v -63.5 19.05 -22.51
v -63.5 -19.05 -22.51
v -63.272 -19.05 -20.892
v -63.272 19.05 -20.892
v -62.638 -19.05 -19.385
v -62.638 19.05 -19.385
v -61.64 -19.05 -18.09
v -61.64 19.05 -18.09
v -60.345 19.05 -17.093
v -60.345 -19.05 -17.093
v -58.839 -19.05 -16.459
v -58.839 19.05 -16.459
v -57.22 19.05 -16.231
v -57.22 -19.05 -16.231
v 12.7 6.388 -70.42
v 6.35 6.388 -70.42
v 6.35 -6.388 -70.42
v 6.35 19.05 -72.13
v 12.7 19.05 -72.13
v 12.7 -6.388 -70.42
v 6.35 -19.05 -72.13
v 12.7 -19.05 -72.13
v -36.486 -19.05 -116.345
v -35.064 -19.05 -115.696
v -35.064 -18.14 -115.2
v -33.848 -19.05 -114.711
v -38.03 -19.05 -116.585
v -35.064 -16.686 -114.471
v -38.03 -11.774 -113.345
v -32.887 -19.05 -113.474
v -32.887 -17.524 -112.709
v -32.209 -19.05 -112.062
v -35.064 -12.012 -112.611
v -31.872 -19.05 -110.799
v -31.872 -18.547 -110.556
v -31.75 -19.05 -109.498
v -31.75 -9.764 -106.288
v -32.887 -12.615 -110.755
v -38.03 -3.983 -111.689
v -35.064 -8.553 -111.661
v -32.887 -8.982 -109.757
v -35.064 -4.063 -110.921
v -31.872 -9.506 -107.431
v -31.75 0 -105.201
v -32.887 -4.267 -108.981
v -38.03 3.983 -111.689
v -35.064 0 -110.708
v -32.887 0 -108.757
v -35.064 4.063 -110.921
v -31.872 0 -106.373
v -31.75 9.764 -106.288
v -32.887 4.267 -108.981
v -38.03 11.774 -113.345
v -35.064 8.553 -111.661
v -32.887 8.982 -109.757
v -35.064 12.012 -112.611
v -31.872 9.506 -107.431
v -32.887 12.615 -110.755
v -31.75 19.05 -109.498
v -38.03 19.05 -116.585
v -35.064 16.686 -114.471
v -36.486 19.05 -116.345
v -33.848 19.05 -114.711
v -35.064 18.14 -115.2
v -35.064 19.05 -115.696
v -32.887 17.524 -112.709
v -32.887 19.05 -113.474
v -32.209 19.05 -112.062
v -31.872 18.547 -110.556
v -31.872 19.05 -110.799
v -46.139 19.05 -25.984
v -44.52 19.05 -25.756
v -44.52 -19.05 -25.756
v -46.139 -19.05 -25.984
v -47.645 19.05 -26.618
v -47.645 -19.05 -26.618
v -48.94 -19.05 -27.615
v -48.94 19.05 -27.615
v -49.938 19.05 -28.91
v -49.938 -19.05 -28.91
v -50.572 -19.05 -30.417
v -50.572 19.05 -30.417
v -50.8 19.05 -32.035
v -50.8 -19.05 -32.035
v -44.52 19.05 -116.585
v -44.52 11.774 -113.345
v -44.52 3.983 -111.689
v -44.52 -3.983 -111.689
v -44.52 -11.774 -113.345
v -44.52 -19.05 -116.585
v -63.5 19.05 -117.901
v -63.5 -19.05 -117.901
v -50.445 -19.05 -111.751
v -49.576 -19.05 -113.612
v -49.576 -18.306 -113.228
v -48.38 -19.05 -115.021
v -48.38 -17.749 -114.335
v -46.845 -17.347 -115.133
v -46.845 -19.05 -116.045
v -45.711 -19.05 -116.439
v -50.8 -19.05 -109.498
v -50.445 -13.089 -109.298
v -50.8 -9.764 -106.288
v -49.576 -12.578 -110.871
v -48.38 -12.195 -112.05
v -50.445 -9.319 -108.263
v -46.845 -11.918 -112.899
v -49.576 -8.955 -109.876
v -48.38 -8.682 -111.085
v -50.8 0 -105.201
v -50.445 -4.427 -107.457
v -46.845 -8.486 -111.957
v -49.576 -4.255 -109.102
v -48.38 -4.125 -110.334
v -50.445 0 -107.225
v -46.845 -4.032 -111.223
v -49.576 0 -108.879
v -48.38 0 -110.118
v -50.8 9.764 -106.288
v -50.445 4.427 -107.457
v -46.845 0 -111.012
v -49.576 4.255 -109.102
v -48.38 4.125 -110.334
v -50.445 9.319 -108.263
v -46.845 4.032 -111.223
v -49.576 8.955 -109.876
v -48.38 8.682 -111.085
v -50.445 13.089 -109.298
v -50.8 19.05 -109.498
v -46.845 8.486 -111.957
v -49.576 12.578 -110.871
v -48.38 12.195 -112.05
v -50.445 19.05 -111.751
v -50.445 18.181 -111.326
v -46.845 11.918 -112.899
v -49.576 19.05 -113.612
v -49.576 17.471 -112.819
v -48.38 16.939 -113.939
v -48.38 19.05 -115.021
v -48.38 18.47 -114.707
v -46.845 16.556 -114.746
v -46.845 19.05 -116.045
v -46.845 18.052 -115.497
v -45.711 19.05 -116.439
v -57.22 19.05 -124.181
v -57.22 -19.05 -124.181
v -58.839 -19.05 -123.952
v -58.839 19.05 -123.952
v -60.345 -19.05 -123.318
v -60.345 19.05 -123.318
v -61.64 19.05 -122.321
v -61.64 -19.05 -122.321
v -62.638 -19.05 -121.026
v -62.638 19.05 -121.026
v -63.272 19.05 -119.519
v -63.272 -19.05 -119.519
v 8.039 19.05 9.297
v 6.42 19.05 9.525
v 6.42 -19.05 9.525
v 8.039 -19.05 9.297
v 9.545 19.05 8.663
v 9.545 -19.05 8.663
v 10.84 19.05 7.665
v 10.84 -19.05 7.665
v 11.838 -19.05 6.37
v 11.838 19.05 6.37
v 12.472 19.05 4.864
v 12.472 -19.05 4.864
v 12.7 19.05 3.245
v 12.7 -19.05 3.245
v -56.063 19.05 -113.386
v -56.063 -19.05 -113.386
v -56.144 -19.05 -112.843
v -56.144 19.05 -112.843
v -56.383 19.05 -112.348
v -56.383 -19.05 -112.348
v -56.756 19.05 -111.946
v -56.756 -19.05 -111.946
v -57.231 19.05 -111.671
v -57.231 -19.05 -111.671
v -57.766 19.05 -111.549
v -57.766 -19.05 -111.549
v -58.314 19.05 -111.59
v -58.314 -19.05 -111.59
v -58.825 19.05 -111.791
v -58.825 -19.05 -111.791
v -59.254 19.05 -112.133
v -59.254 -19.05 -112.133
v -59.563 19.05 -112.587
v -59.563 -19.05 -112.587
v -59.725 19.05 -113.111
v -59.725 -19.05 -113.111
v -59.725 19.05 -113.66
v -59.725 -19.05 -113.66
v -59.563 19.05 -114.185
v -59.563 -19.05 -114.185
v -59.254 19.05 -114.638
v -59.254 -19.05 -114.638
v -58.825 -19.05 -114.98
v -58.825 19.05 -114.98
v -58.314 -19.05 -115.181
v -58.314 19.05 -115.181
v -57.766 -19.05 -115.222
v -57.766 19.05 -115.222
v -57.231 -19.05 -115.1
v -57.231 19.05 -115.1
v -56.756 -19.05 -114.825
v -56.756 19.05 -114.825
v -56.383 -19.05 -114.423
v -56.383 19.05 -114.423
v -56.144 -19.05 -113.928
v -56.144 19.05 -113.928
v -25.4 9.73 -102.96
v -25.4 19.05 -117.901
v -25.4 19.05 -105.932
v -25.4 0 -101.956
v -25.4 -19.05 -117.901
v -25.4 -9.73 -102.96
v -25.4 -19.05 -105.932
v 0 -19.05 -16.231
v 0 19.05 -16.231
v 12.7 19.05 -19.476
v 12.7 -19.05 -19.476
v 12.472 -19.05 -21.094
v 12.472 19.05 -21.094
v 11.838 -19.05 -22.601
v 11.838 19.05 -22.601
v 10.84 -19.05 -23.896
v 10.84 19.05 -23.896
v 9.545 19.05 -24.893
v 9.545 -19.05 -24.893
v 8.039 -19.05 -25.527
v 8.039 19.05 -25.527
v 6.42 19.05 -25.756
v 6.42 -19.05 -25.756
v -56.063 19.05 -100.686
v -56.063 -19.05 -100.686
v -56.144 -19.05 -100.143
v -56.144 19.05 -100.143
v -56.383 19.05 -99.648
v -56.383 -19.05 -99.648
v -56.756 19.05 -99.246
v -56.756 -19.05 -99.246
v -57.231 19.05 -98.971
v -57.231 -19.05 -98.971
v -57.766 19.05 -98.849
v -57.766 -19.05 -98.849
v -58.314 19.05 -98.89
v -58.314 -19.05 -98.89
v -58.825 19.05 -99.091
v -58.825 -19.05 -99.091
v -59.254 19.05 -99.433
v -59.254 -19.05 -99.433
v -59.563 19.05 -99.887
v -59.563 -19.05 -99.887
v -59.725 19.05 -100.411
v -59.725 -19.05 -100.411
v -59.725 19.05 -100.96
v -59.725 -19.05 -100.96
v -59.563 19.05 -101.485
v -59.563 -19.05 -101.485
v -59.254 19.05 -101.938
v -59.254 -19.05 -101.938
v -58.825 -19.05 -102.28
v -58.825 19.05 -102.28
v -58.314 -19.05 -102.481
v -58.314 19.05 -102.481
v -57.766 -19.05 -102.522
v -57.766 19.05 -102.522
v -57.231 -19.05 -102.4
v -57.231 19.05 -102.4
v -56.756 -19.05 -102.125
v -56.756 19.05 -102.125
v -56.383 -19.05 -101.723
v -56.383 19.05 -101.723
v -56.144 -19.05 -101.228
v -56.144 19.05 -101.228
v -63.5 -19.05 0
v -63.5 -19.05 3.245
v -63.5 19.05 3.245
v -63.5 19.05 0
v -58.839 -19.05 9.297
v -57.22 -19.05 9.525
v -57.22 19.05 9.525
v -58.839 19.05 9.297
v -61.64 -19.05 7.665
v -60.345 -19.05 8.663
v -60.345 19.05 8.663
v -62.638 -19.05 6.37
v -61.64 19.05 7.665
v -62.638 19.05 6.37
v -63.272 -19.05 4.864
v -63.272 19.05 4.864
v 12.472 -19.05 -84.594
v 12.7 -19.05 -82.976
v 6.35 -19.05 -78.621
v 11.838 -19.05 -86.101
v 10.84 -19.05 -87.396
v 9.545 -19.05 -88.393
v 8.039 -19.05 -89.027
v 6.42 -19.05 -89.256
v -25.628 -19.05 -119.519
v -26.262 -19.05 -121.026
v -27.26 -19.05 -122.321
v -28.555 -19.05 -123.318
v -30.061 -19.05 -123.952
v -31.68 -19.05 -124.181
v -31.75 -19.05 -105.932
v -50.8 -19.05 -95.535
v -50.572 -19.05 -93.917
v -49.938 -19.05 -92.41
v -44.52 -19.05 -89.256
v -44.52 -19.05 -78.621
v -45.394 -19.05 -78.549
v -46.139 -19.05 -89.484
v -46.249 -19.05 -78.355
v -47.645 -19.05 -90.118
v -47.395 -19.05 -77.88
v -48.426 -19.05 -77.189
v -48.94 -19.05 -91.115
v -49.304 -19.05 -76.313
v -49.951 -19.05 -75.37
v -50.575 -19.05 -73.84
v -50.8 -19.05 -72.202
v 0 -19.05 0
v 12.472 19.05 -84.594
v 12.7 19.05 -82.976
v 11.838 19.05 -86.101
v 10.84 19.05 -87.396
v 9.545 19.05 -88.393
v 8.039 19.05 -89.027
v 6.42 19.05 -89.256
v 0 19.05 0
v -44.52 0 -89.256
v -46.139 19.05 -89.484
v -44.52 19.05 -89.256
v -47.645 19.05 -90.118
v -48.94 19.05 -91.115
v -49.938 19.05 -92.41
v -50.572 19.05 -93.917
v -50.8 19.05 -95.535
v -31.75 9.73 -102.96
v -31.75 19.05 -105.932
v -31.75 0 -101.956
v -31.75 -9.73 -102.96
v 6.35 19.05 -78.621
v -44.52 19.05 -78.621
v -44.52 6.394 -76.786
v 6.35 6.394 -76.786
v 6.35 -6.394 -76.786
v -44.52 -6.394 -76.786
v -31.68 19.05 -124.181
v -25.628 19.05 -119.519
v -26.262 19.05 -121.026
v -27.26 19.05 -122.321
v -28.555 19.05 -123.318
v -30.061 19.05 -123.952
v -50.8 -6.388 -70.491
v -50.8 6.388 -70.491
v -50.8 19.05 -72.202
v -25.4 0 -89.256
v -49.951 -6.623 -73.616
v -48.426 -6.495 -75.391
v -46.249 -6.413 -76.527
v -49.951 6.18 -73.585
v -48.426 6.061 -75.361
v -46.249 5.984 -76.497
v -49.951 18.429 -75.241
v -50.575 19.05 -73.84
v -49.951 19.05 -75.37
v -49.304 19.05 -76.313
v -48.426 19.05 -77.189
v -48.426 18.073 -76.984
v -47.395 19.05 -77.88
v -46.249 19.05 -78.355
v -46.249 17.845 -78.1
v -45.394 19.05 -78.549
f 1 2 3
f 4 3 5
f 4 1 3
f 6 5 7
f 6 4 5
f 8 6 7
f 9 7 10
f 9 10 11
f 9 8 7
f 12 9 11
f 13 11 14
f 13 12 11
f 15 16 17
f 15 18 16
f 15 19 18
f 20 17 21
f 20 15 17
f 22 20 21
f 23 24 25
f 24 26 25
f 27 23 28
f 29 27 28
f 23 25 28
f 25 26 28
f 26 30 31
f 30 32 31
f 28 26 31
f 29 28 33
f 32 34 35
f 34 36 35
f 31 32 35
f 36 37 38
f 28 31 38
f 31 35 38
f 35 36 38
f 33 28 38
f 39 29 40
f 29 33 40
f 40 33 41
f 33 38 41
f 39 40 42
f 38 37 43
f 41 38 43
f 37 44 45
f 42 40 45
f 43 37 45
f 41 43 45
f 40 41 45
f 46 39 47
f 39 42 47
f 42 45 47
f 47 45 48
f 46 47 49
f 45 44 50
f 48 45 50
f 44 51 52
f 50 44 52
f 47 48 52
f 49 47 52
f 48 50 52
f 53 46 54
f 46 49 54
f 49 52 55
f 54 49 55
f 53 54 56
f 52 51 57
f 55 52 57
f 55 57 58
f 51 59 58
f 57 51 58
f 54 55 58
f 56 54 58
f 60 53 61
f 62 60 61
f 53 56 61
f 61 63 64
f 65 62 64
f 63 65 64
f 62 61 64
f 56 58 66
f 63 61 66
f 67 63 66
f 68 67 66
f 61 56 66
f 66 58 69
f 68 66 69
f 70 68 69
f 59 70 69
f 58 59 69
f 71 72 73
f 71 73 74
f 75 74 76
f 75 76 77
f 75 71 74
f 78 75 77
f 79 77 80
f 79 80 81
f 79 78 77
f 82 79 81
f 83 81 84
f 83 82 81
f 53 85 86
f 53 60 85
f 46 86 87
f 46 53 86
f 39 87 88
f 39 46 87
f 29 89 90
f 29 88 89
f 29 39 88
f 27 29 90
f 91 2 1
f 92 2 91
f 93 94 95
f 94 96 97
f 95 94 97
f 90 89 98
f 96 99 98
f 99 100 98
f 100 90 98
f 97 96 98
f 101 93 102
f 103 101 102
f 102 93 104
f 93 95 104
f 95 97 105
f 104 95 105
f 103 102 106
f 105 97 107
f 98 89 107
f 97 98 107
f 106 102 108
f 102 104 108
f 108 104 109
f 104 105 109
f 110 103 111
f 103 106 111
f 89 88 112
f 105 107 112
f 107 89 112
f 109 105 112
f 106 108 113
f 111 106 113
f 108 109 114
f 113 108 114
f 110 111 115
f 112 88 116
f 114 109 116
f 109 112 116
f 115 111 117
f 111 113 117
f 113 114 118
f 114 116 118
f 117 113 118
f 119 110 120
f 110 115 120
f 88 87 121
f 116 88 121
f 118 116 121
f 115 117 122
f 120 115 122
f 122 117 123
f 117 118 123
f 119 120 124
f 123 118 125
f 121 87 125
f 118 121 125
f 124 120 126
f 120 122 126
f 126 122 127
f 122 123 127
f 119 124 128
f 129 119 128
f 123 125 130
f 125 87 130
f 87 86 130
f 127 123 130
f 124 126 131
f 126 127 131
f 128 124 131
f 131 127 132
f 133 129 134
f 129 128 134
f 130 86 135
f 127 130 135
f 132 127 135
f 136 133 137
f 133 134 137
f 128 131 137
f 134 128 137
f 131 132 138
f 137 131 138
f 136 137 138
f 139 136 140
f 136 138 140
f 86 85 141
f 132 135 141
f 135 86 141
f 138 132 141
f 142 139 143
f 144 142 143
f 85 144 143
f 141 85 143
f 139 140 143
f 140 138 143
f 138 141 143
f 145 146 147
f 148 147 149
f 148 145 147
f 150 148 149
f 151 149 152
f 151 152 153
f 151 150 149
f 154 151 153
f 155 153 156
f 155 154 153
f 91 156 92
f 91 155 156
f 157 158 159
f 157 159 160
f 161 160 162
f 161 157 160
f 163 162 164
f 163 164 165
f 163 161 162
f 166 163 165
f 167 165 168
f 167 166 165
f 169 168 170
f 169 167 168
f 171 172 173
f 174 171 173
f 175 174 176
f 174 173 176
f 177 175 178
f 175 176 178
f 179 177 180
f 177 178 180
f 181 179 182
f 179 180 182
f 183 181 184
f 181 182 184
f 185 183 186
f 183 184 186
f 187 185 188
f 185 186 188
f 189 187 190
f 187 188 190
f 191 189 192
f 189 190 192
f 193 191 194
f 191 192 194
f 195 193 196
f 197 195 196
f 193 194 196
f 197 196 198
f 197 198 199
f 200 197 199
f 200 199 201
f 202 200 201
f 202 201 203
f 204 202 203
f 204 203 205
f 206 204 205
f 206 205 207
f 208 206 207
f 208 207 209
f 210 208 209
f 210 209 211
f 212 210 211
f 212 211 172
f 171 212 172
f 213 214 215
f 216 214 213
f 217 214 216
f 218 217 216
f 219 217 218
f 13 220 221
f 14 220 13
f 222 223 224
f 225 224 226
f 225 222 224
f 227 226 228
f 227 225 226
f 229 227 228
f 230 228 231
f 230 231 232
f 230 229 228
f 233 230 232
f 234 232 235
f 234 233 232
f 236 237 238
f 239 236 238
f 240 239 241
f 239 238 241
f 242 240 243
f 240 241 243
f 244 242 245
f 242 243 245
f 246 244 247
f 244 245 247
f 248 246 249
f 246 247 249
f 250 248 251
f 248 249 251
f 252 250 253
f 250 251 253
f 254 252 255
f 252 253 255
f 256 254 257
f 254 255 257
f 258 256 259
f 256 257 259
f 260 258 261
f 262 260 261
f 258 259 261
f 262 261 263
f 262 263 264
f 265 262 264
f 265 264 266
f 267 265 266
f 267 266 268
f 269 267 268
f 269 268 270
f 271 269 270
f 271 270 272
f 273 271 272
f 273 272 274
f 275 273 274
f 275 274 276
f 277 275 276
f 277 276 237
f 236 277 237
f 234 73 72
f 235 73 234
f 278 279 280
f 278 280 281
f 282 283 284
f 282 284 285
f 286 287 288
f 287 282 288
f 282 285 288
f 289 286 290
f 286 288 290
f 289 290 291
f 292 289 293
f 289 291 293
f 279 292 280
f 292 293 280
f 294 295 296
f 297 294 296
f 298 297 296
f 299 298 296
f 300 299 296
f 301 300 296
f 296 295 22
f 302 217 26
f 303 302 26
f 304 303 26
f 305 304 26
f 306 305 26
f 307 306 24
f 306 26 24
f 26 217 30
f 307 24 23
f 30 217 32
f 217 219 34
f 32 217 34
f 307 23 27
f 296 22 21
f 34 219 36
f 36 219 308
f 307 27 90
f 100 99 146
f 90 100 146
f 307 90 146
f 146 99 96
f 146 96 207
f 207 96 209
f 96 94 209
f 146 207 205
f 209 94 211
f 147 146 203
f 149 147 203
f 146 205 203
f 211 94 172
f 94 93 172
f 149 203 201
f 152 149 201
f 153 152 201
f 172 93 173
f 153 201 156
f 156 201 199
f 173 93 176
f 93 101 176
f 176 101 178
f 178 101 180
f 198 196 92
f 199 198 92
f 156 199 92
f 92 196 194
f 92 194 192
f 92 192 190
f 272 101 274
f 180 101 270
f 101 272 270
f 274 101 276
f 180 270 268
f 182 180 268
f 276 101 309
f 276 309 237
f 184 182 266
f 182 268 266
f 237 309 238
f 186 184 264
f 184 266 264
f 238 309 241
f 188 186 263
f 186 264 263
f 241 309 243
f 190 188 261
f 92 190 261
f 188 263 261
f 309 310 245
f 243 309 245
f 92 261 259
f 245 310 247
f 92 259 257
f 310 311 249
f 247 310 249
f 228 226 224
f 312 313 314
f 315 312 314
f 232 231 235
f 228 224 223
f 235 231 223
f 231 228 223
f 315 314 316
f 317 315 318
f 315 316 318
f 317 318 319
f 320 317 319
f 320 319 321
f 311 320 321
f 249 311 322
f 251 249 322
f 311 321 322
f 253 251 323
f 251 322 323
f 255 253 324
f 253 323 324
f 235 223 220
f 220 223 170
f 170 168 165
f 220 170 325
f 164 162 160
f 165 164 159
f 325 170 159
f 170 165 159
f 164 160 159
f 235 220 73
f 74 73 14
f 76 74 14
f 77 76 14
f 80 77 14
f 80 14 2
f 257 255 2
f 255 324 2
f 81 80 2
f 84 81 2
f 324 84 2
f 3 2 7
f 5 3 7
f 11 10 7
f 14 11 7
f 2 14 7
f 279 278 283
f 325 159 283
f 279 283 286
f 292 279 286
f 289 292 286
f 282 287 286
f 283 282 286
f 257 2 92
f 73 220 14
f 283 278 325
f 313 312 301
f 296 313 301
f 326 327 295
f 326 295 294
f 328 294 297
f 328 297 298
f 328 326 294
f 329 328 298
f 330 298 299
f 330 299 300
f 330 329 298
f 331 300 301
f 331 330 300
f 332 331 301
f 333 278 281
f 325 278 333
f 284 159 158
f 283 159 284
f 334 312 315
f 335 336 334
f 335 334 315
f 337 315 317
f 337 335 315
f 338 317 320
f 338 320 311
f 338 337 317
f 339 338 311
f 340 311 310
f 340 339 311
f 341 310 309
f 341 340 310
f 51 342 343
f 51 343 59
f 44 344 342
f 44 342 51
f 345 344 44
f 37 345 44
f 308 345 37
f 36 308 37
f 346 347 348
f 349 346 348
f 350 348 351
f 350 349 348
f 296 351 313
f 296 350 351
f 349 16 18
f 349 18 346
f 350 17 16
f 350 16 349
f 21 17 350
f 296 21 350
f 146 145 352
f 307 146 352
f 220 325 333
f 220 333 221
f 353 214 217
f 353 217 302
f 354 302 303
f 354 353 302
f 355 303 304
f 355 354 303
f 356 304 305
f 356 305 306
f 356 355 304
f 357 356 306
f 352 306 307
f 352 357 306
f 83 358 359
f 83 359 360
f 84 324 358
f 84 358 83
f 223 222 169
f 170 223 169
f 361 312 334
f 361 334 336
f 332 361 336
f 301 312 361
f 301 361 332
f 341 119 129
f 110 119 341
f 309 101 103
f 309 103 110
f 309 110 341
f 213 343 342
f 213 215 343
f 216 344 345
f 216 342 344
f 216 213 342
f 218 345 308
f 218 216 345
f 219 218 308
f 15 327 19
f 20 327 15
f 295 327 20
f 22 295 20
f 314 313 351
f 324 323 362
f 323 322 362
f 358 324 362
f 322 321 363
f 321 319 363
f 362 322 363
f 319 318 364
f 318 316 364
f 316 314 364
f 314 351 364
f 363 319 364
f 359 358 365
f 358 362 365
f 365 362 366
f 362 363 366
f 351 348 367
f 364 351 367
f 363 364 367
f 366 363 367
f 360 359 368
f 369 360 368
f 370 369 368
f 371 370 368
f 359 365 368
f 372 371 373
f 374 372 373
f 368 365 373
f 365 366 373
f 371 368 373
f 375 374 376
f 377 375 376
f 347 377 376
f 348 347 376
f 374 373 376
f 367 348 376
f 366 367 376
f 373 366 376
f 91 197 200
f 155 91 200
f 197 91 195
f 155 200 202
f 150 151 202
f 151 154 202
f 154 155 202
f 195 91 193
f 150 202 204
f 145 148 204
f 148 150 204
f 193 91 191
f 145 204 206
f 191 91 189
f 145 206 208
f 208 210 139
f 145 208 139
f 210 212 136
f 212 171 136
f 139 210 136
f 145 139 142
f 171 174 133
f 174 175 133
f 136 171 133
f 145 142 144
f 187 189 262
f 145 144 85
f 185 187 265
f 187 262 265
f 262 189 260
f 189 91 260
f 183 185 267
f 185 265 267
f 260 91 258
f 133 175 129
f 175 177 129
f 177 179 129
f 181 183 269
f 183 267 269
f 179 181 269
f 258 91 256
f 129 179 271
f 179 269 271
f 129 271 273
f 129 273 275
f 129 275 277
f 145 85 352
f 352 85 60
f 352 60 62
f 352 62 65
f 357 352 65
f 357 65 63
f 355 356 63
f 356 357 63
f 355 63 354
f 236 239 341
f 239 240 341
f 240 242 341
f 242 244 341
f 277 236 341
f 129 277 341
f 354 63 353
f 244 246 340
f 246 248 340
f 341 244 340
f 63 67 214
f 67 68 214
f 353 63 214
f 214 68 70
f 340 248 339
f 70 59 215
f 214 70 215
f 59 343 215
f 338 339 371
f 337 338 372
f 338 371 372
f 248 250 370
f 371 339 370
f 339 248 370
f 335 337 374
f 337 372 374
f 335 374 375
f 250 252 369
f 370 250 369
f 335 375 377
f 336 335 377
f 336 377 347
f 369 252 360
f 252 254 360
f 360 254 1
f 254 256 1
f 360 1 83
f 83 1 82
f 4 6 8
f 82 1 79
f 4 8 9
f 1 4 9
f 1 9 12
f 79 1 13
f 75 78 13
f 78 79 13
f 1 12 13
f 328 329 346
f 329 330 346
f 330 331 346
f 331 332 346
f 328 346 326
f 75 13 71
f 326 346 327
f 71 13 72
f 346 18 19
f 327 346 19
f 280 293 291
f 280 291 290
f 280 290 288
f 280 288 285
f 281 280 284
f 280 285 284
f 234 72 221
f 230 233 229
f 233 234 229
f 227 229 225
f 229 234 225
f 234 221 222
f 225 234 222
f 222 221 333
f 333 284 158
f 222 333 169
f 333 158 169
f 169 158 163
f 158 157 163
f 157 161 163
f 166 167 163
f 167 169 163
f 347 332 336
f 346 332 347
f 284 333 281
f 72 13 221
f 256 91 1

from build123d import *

# Parameters (mm, degrees)
F1_DEPTH     = 19.05
F6_T1_DEPTH  = 38.1
F6_T3_DEPTH  = 19.05
F6_T5_DEPTH  = 19.05
F6_T10_ANGLE = 45.2137620144
F6_T16_ANGLE = 107.7622686142
F6_T22_ANGLE = 107.7622686142
F6_T25_DEPTH = 69.8548284901
F7_R         = 1.8415
F8_DEPTH     = 38.1010001


# Not quite as in the source:
# - a fillet or chamfer that OpenCascade refuses, or shapes differently, is made with other operations: its cross-section is extruded or revolved along the edge and cut away or added


with BuildPart() as f1:
    # F0 (on Front) → F1 (new body, symmetric)
    with BuildSketch(Plane.XZ):
        Polygon((-63.5, 0), (0, 0), (0, -16.2306), (-63.5, -16.2306), (-63.5, -124.1806), (-25.4, -124.1806), (-25.4, -101.9556), (-31.75, -101.9556), (-31.75, -111.4806), (-50.8, -111.4806), (-50.8, -89.2556), (12.7, -89.2556), (12.7, -70.2056), (6.35, -70.2056), (6.35, -76.5556), (-50.8, -76.5556), (-50.8, -25.7556), (12.7, -25.7556), (12.7, 9.525), (-63.5, 9.525), align=None)
    extrude(amount=F1_DEPTH, both=True)

    # F2 (on Front) → F3 (revolve, cut)
    with BuildSketch(Plane.XZ):
        Polygon((-50.8, -57.5056), (-50.8, -76.5556), (6.35, -76.5556), (6.35, -70.2056), (12.7, -70.2056), (12.7, -57.5056), align=None)
    revolve(axis=Axis((-20.4399991781, 0, -165.4556), (1, 0, 0)), mode=Mode.SUBTRACT)

    # F4 (on Front) → F5 (revolve, cut)
    with BuildSketch(Plane.XZ):
        Polygon((-50.8, -89.2556), (-50.8, -111.4806), (-31.75, -111.4806), (-31.75, -101.9556), (-25.4, -101.9556), (-25.4, -89.2556), align=None)
    revolve(axis=Axis((-41.275, 0, -149.5806), (1, 0, 0)), mode=Mode.SUBTRACT)

    # F6: fillet of radius 6.35 on 13 edges, made by hand

    # F6_s2 → F6_t1 (join)
    with BuildSketch(Plane.XZ.offset(-19.05)):
        with BuildLine():
            ThreePointArc((-44.4490343146, -25.7552), (-48.9401280605, -27.6154719395), (-50.8004, -32.1065656854))
            Line((-50.8004, -32.1065656854), (-51.4355365685, -32.1065656854))
            ThreePointArc((-51.4355365685, -32.1065656854), (-51.4351365685, -28.9310828427), (-51.4351365685, -25.7556))
            Line((-51.4351365685, -25.7556), (-50.8, -25.1204634315))
            ThreePointArc((-50.8, -25.1204634315), (-47.6245171573, -25.1204634315), (-44.4490343146, -25.1200634315))
            Line((-44.4490343146, -25.1200634315), (-44.4490343146, -25.7552))
        make_face()
    extrude(amount=F6_T1_DEPTH)

    # F6_s4 → F6_t3 (join)
    with BuildSketch(Plane.XZ.offset(-19.05)):
        with BuildLine():
            ThreePointArc((-44.4490343146, -89.2552), (-48.9401280605, -91.1154719395), (-50.8004, -95.6065656854))
            Line((-50.8004, -95.6065656854), (-51.4355365685, -95.6065656854))
            ThreePointArc((-51.4355365685, -95.6065656854), (-51.4351365685, -92.4310828427), (-51.4351365685, -89.2556))
            Line((-51.4351365685, -89.2556), (-50.8, -88.6204634315))
            ThreePointArc((-50.8, -88.6204634315), (-47.6245171573, -88.6204634315), (-44.4490343146, -88.6200634315))
            Line((-44.4490343146, -88.6200634315), (-44.4490343146, -89.2552))
        make_face()
    extrude(amount=F6_T3_DEPTH)

    # F6_s6 → F6_t5 (join)
    with BuildSketch(Plane.XZ):
        with BuildLine():
            ThreePointArc((-44.4490343146, -89.2552), (-48.9401280605, -91.1154719395), (-50.8004, -95.6065656854))
            Line((-50.8004, -95.6065656854), (-51.4355365685, -95.6065656854))
            ThreePointArc((-51.4355365685, -95.6065656854), (-51.4351365685, -92.4310828427), (-51.4351365685, -89.2556))
            Line((-51.4351365685, -89.2556), (-50.8, -88.6204634315))
            ThreePointArc((-50.8, -88.6204634315), (-47.6245171573, -88.6204634315), (-44.4490343146, -88.6200634315))
            Line((-44.4490343146, -88.6200634315), (-44.4490343146, -89.2552))
        make_face()
    extrude(amount=F6_T5_DEPTH)


with BuildPart() as f6_tool8:
    # F6_s9 → F6_t10 (revolve)
    with BuildSketch(Plane(origin=(0, -58.7152257849, -24.4490632784), x_dir=(1, 0, 0), z_dir=(0, -0.923164058, -0.384406194))):
        with BuildLine():
            ThreePointArc((-50.8004, -57.4916974353), (-48.9401280605, -61.9827911812), (-44.4490343146, -63.8430631207))
            Line((-44.4490343146, -63.8430631207), (-44.4490343146, -64.4781996892))
            ThreePointArc((-44.4490343146, -64.4781996892), (-47.6245171573, -64.4777996892), (-50.8, -64.4777996892))
            Line((-50.8, -64.4777996892), (-51.4351365685, -63.8426631207))
            ThreePointArc((-51.4351365685, -63.8426631207), (-51.4351365685, -60.667180278), (-51.4355365685, -57.4916974353))
            Line((-51.4355365685, -57.4916974353), (-50.8004, -57.4916974353))
        make_face()
    revolve(axis=Axis((-50.8, 0, -165.4556), (-1, 0, 0)), revolution_arc=F6_T10_ANGLE)

    split(bisect_by=Plane.XZ.offset(19.05), keep=Keep.BOTTOM)

    split(bisect_by=Plane.XZ.offset(-19.05), keep=Keep.TOP)


with BuildPart() as f1_1:
    add(f1.part)

    # F6_t7: union F6_tool8
    add(f6_tool8.part)


with BuildPart() as f6_tool14:
    # F6_s15 → F6_t16 (revolve)
    with BuildSketch(Plane(origin=(0, -71.2250836382, -97.6064441708), x_dir=(1, 0, 0), z_dir=(0, -0.589462371, -0.8077958363))):
        with BuildLine():
            ThreePointArc((-50.8004, -43.7211694448), (-48.9401280605, -48.2122631908), (-44.4490343146, -50.0725351302))
            Line((-44.4490343146, -50.0725351302), (-44.4490343146, -50.7076716988))
            ThreePointArc((-44.4490343146, -50.7076716988), (-47.6245171573, -50.7072716988), (-50.8, -50.7072716988))
            Line((-50.8, -50.7072716988), (-51.4351365685, -50.0721351302))
            ThreePointArc((-51.4351365685, -50.0721351302), (-51.4351365685, -46.8966522875), (-51.4355365685, -43.7211694448))
            Line((-51.4355365685, -43.7211694448), (-50.8004, -43.7211694448))
        make_face()
    revolve(axis=Axis((-50.8, 0, -149.5806), (-1, 0, 0)), revolution_arc=F6_T16_ANGLE)

    split(bisect_by=Plane.XZ.offset(19.05), keep=Keep.BOTTOM)

    split(bisect_by=Plane.XZ.offset(-19.05), keep=Keep.TOP)


with BuildPart() as f1_2:
    add(f1_1.part)

    # F6_t13: union F6_tool14
    add(f6_tool14.part)


with BuildPart() as f6_tool20:
    # F6_s21 → F6_t22 (revolve)
    with BuildSketch(Plane(origin=(0, -71.2250836382, -97.6064441708), x_dir=(1, 0, 0), z_dir=(0, -0.589462371, -0.8077958363))):
        with BuildLine():
            ThreePointArc((-38.1009656854, -50.0725351302), (-33.6098719395, -48.2122631908), (-31.7496, -43.7211694448))
            Line((-31.7496, -43.7211694448), (-31.1144634315, -43.7211694448))
            ThreePointArc((-31.1144634315, -43.7211694448), (-31.1148634315, -46.8966522875), (-31.1148634315, -50.0721351302))
            Line((-31.1148634315, -50.0721351302), (-31.75, -50.7072716988))
            ThreePointArc((-31.75, -50.7072716988), (-34.9254828427, -50.7072716988), (-38.1009656854, -50.7076716988))
            Line((-38.1009656854, -50.7076716988), (-38.1009656854, -50.0725351302))
        make_face()
    revolve(axis=Axis((-31.75, 0, -149.5806), (-1, 0, 0)), revolution_arc=F6_T22_ANGLE)

    split(bisect_by=Plane.XZ.offset(19.05), keep=Keep.BOTTOM)

    split(bisect_by=Plane.XZ.offset(-19.05), keep=Keep.TOP)


with BuildPart() as f1_3:
    add(f1_2.part)

    # F6_t19: union F6_tool20
    add(f6_tool20.part)

    # F6_s26 → F6_t25 (cut)
    with BuildSketch(Plane.XZ.offset(-34.9274142451)):
        with BuildLine():
            ThreePointArc((6.3490343146, 9.5254), (10.8401280605, 7.6651280605), (12.7004, 3.1740343146))
            Line((12.7004, 3.1740343146), (13.3355365685, 3.1740343146))
            ThreePointArc((13.3355365685, 3.1740343146), (13.3351365685, 6.3495171573), (13.3351365685, 9.525))
            Line((13.3351365685, 9.525), (12.7, 10.1601365685))
            ThreePointArc((12.7, 10.1601365685), (9.5245171573, 10.1601365685), (6.3490343146, 10.1605365685))
            Line((6.3490343146, 10.1605365685), (6.3490343146, 9.5254))
        make_face()
        with BuildLine():
            ThreePointArc((-57.1490343146, 9.5254), (-61.6401280605, 7.6651280605), (-63.5004, 3.1740343146))
            Line((-63.5004, 3.1740343146), (-64.1355365685, 3.1740343146))
            ThreePointArc((-64.1355365685, 3.1740343146), (-64.1351365685, 6.3495171573), (-64.1351365685, 9.525))
            Line((-64.1351365685, 9.525), (-63.5, 10.1601365685))
            ThreePointArc((-63.5, 10.1601365685), (-60.3245171573, 10.1601365685), (-57.1490343146, 10.1605365685))
            Line((-57.1490343146, 10.1605365685), (-57.1490343146, 9.5254))
        make_face()
        with BuildLine():
            ThreePointArc((-63.5004, -22.5815656854), (-61.6401280605, -18.0904719395), (-57.1490343146, -16.2302))
            Line((-57.1490343146, -16.2302), (-57.1490343146, -15.5950634315))
            ThreePointArc((-57.1490343146, -15.5950634315), (-60.3245171573, -15.5954634315), (-63.5, -15.5954634315))
            Line((-63.5, -15.5954634315), (-64.1351365685, -16.2306))
            ThreePointArc((-64.1351365685, -16.2306), (-64.1351365685, -19.4060828427), (-64.1355365685, -22.5815656854))
            Line((-64.1355365685, -22.5815656854), (-63.5004, -22.5815656854))
        make_face()
        with BuildLine():
            ThreePointArc((12.7004, -19.4046343146), (10.8401280605, -23.8957280605), (6.3490343146, -25.756))
            Line((6.3490343146, -25.756), (6.3490343146, -26.3911365685))
            ThreePointArc((6.3490343146, -26.3911365685), (9.5245171573, -26.3907365685), (12.7, -26.3907365685))
            Line((12.7, -26.3907365685), (13.3351365685, -25.7556))
            ThreePointArc((13.3351365685, -25.7556), (13.3351365685, -22.5801171573), (13.3355365685, -19.4046343146))
            Line((13.3355365685, -19.4046343146), (12.7004, -19.4046343146))
        make_face()
        with BuildLine():
            ThreePointArc((-57.1490343146, -124.181), (-61.6401280605, -122.3207280605), (-63.5004, -117.8296343146))
            Line((-63.5004, -117.8296343146), (-64.1355365685, -117.8296343146))
            ThreePointArc((-64.1355365685, -117.8296343146), (-64.1351365685, -121.0051171573), (-64.1351365685, -124.1806))
            Line((-64.1351365685, -124.1806), (-63.5, -124.8157365685))
            ThreePointArc((-63.5, -124.8157365685), (-60.3245171573, -124.8157365685), (-57.1490343146, -124.8161365685))
            Line((-57.1490343146, -124.8161365685), (-57.1490343146, -124.181))
        make_face()
        with BuildLine():
            ThreePointArc((-25.3996, -117.8296343146), (-27.2598719395, -122.3207280605), (-31.7509656854, -124.181))
            Line((-31.7509656854, -124.181), (-31.7509656854, -124.8161365685))
            ThreePointArc((-31.7509656854, -124.8161365685), (-28.5754828427, -124.8157365685), (-25.4, -124.8157365685))
            Line((-25.4, -124.8157365685), (-24.7648634315, -124.1806))
            ThreePointArc((-24.7648634315, -124.1806), (-24.7648634315, -121.0051171573), (-24.7644634315, -117.8296343146))
            Line((-24.7644634315, -117.8296343146), (-25.3996, -117.8296343146))
        make_face()
        with BuildLine():
            ThreePointArc((12.7004, -82.9046343146), (10.8401280605, -87.3957280605), (6.3490343146, -89.256))
            Line((6.3490343146, -89.256), (6.3490343146, -89.8911365685))
            ThreePointArc((6.3490343146, -89.8911365685), (9.5245171573, -89.8907365685), (12.7, -89.8907365685))
            Line((12.7, -89.8907365685), (13.3351365685, -89.2556))
            ThreePointArc((13.3351365685, -89.2556), (13.3351365685, -86.0801171573), (13.3355365685, -82.9046343146))
            Line((13.3355365685, -82.9046343146), (12.7004, -82.9046343146))
        make_face()
    extrude(amount=F6_T25_DEPTH, mode=Mode.SUBTRACT)

    # F7 (on face) → F8 (cut, through all)
    with BuildSketch(Plane.XZ.offset(19.05)):
        with Locations((-57.9040207225, -100.6856)):
            Circle(F7_R)
        with Locations((-57.9040207225, -113.3856)):
            Circle(F7_R)
    extrude(amount=-F8_DEPTH, mode=Mode.SUBTRACT)


solid = f1_3.part
